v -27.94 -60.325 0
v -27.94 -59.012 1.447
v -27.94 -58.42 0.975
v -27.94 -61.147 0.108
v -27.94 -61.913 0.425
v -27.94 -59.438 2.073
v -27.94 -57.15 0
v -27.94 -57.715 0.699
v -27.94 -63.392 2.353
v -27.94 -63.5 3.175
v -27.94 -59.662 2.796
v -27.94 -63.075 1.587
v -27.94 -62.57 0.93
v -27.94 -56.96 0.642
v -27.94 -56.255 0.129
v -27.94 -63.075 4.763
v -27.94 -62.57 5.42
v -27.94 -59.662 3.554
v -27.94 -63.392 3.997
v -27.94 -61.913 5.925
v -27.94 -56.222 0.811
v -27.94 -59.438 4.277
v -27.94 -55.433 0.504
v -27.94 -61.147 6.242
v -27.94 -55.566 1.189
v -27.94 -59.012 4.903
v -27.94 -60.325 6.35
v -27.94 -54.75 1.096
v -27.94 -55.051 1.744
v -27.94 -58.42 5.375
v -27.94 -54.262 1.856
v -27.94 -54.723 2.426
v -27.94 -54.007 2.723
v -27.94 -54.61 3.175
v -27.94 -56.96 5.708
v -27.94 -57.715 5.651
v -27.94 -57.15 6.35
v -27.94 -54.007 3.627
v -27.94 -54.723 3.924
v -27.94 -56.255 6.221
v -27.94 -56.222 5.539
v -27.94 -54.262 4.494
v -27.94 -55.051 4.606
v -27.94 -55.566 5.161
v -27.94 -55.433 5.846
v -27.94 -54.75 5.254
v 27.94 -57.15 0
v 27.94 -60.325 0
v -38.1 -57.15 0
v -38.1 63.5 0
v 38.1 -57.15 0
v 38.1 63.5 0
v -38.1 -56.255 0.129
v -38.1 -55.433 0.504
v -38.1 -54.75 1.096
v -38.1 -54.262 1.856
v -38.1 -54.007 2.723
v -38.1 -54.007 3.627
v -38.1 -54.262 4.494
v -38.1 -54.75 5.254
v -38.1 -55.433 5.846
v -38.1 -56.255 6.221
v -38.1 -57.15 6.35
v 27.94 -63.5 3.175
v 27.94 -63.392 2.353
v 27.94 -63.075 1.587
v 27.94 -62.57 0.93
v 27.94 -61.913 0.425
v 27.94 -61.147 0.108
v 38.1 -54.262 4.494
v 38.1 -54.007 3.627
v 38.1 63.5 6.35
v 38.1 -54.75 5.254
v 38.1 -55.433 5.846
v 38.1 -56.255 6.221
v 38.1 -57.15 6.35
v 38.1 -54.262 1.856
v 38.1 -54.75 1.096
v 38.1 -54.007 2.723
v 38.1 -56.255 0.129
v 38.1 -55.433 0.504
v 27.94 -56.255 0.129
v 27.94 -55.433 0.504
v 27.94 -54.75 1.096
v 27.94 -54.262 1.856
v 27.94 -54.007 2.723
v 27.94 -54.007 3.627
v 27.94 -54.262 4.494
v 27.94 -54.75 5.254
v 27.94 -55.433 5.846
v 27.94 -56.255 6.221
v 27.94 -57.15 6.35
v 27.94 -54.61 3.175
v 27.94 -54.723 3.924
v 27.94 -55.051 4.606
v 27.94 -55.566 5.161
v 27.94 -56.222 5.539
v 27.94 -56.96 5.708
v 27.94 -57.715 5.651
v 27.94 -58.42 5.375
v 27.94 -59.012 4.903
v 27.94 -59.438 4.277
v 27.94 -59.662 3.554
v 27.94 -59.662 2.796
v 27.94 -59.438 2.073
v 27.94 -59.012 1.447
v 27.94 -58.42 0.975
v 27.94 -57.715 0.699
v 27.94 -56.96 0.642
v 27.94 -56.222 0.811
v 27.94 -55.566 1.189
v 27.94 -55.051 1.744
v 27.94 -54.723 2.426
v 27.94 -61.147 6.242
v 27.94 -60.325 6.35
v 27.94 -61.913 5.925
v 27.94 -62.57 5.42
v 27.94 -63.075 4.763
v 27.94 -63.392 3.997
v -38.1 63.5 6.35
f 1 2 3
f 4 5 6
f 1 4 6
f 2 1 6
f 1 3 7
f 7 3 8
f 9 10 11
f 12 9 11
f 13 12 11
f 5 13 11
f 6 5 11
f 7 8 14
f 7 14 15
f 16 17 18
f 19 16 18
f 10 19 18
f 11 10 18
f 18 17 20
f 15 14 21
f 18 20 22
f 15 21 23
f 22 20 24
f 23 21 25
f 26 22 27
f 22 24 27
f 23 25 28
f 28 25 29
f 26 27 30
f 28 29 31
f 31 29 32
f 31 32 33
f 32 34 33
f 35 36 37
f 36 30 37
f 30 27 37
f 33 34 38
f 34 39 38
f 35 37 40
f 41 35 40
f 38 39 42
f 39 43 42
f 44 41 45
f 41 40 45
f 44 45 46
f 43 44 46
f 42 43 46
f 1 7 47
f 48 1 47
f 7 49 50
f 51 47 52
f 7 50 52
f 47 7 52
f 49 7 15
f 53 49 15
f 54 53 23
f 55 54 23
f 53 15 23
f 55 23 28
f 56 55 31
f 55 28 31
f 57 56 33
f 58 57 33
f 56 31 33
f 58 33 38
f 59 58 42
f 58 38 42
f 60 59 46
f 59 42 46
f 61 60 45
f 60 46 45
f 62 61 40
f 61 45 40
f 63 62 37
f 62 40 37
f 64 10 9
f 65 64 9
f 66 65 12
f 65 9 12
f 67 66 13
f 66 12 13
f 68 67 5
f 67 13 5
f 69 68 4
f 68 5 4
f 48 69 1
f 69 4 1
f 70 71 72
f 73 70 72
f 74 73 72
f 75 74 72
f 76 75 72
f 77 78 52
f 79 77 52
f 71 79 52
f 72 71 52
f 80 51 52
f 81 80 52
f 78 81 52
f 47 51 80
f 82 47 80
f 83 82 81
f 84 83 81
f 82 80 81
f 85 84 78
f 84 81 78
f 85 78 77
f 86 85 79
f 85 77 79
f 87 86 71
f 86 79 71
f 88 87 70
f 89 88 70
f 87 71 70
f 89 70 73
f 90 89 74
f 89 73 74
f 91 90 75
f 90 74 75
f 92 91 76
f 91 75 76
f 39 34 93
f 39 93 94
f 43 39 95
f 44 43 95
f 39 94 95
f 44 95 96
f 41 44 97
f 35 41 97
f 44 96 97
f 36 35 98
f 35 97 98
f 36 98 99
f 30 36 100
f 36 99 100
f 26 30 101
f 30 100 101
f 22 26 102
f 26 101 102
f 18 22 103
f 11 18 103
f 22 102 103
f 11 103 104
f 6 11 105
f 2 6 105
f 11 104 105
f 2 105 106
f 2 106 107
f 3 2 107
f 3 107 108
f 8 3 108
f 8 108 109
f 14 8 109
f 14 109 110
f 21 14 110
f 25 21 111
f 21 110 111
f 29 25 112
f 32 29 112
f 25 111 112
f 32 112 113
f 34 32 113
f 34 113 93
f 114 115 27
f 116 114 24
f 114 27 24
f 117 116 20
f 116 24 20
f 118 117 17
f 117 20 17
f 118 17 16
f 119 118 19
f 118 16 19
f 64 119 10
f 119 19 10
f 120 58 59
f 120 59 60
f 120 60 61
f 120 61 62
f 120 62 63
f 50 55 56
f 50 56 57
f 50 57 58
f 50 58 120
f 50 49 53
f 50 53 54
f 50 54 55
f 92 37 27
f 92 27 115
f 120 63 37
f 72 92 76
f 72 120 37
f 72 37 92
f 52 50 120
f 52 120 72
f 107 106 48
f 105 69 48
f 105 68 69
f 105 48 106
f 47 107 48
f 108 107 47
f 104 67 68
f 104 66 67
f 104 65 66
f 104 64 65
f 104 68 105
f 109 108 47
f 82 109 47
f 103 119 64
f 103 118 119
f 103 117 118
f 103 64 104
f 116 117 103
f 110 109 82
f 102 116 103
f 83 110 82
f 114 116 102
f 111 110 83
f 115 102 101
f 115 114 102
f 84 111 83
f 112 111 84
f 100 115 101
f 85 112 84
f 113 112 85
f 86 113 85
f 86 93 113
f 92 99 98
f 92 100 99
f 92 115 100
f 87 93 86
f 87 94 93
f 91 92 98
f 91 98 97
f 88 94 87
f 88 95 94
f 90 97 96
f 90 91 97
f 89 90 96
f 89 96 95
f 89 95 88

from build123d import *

# Parameters (mm, degrees)
F0_W      = 76.2
F0_H      = 127
F1_DEPTH  = 6.35
F2_W      = 10.16
F2_H      = 6.35
F3_DEPTH  = 25.4
F5_DEPTH  = 76.2
F7_DEPTH  = 38.1
F8_W      = 55.88
F8_H      = 9.9150016904
F9_DEPTH  = 6.35
F11_R     = 2.54
F12_DEPTH = 27.94


with BuildPart() as f1:
    # F0 (on Top) → F1 (new body)
    with BuildSketch(Plane.XY):
        Rectangle(F0_W, F0_H)
    extrude(amount=F1_DEPTH)

    # F2 (on face) → F3 (cut)
    with BuildSketch(Plane.XY.offset(6.35)):
        with Locations((-33.02, -60.325)):
            Rectangle(F2_W, F2_H)
        with Locations((33.02, -60.325)):
            Rectangle(F2_W, F2_H)
    extrude(amount=-F3_DEPTH, mode=Mode.SUBTRACT)

    # F4 (on face) → F5 (cut)
    with BuildSketch(Plane(origin=(-27.94, 0, 0), x_dir=(0, -1, 0), z_dir=(-1, 0, 0))):
        with BuildLine():
            ThreePointArc((60.325, 6.35), (62.5700640303, 5.4200640303), (63.5, 3.175))
            Line((63.5, 3.175), (63.5, 6.35))
            Line((63.5, 6.35), (60.325, 6.35))
        make_face()
        with BuildLine():
            Line((63.5, 0), (63.5, 3.175))
            ThreePointArc((63.5, 3.175), (62.5700640303, 0.9299359697), (60.325, 0))
            Line((60.325, 0), (63.5, 0))
        make_face()
    extrude(amount=-F5_DEPTH, mode=Mode.SUBTRACT)

    # F6 (on Right) → F7 (cut, symmetric)
    with BuildSketch(Plane.YZ):
        with BuildLine():
            Line((-57.15, 6.35), (-57.15, 0))
            ThreePointArc((-57.15, 0), (-53.975, 3.175), (-57.15, 6.35))
        make_face()
    extrude(amount=F7_DEPTH, both=True, mode=Mode.SUBTRACT)

    # F8 (on Top) → F9 (join)
    with BuildSketch(Plane.XY):
        with Locations((0, -52.1924991548)):
            Rectangle(F8_W, F8_H)
    extrude(amount=F9_DEPTH)

    # F11 (on Right) → F12 (cut, symmetric)
    with BuildSketch(Plane.YZ):
        with Locations((-57.15, 3.175)):
            Circle(F11_R)
    extrude(amount=F12_DEPTH, both=True, mode=Mode.SUBTRACT)


solid = f1.part
